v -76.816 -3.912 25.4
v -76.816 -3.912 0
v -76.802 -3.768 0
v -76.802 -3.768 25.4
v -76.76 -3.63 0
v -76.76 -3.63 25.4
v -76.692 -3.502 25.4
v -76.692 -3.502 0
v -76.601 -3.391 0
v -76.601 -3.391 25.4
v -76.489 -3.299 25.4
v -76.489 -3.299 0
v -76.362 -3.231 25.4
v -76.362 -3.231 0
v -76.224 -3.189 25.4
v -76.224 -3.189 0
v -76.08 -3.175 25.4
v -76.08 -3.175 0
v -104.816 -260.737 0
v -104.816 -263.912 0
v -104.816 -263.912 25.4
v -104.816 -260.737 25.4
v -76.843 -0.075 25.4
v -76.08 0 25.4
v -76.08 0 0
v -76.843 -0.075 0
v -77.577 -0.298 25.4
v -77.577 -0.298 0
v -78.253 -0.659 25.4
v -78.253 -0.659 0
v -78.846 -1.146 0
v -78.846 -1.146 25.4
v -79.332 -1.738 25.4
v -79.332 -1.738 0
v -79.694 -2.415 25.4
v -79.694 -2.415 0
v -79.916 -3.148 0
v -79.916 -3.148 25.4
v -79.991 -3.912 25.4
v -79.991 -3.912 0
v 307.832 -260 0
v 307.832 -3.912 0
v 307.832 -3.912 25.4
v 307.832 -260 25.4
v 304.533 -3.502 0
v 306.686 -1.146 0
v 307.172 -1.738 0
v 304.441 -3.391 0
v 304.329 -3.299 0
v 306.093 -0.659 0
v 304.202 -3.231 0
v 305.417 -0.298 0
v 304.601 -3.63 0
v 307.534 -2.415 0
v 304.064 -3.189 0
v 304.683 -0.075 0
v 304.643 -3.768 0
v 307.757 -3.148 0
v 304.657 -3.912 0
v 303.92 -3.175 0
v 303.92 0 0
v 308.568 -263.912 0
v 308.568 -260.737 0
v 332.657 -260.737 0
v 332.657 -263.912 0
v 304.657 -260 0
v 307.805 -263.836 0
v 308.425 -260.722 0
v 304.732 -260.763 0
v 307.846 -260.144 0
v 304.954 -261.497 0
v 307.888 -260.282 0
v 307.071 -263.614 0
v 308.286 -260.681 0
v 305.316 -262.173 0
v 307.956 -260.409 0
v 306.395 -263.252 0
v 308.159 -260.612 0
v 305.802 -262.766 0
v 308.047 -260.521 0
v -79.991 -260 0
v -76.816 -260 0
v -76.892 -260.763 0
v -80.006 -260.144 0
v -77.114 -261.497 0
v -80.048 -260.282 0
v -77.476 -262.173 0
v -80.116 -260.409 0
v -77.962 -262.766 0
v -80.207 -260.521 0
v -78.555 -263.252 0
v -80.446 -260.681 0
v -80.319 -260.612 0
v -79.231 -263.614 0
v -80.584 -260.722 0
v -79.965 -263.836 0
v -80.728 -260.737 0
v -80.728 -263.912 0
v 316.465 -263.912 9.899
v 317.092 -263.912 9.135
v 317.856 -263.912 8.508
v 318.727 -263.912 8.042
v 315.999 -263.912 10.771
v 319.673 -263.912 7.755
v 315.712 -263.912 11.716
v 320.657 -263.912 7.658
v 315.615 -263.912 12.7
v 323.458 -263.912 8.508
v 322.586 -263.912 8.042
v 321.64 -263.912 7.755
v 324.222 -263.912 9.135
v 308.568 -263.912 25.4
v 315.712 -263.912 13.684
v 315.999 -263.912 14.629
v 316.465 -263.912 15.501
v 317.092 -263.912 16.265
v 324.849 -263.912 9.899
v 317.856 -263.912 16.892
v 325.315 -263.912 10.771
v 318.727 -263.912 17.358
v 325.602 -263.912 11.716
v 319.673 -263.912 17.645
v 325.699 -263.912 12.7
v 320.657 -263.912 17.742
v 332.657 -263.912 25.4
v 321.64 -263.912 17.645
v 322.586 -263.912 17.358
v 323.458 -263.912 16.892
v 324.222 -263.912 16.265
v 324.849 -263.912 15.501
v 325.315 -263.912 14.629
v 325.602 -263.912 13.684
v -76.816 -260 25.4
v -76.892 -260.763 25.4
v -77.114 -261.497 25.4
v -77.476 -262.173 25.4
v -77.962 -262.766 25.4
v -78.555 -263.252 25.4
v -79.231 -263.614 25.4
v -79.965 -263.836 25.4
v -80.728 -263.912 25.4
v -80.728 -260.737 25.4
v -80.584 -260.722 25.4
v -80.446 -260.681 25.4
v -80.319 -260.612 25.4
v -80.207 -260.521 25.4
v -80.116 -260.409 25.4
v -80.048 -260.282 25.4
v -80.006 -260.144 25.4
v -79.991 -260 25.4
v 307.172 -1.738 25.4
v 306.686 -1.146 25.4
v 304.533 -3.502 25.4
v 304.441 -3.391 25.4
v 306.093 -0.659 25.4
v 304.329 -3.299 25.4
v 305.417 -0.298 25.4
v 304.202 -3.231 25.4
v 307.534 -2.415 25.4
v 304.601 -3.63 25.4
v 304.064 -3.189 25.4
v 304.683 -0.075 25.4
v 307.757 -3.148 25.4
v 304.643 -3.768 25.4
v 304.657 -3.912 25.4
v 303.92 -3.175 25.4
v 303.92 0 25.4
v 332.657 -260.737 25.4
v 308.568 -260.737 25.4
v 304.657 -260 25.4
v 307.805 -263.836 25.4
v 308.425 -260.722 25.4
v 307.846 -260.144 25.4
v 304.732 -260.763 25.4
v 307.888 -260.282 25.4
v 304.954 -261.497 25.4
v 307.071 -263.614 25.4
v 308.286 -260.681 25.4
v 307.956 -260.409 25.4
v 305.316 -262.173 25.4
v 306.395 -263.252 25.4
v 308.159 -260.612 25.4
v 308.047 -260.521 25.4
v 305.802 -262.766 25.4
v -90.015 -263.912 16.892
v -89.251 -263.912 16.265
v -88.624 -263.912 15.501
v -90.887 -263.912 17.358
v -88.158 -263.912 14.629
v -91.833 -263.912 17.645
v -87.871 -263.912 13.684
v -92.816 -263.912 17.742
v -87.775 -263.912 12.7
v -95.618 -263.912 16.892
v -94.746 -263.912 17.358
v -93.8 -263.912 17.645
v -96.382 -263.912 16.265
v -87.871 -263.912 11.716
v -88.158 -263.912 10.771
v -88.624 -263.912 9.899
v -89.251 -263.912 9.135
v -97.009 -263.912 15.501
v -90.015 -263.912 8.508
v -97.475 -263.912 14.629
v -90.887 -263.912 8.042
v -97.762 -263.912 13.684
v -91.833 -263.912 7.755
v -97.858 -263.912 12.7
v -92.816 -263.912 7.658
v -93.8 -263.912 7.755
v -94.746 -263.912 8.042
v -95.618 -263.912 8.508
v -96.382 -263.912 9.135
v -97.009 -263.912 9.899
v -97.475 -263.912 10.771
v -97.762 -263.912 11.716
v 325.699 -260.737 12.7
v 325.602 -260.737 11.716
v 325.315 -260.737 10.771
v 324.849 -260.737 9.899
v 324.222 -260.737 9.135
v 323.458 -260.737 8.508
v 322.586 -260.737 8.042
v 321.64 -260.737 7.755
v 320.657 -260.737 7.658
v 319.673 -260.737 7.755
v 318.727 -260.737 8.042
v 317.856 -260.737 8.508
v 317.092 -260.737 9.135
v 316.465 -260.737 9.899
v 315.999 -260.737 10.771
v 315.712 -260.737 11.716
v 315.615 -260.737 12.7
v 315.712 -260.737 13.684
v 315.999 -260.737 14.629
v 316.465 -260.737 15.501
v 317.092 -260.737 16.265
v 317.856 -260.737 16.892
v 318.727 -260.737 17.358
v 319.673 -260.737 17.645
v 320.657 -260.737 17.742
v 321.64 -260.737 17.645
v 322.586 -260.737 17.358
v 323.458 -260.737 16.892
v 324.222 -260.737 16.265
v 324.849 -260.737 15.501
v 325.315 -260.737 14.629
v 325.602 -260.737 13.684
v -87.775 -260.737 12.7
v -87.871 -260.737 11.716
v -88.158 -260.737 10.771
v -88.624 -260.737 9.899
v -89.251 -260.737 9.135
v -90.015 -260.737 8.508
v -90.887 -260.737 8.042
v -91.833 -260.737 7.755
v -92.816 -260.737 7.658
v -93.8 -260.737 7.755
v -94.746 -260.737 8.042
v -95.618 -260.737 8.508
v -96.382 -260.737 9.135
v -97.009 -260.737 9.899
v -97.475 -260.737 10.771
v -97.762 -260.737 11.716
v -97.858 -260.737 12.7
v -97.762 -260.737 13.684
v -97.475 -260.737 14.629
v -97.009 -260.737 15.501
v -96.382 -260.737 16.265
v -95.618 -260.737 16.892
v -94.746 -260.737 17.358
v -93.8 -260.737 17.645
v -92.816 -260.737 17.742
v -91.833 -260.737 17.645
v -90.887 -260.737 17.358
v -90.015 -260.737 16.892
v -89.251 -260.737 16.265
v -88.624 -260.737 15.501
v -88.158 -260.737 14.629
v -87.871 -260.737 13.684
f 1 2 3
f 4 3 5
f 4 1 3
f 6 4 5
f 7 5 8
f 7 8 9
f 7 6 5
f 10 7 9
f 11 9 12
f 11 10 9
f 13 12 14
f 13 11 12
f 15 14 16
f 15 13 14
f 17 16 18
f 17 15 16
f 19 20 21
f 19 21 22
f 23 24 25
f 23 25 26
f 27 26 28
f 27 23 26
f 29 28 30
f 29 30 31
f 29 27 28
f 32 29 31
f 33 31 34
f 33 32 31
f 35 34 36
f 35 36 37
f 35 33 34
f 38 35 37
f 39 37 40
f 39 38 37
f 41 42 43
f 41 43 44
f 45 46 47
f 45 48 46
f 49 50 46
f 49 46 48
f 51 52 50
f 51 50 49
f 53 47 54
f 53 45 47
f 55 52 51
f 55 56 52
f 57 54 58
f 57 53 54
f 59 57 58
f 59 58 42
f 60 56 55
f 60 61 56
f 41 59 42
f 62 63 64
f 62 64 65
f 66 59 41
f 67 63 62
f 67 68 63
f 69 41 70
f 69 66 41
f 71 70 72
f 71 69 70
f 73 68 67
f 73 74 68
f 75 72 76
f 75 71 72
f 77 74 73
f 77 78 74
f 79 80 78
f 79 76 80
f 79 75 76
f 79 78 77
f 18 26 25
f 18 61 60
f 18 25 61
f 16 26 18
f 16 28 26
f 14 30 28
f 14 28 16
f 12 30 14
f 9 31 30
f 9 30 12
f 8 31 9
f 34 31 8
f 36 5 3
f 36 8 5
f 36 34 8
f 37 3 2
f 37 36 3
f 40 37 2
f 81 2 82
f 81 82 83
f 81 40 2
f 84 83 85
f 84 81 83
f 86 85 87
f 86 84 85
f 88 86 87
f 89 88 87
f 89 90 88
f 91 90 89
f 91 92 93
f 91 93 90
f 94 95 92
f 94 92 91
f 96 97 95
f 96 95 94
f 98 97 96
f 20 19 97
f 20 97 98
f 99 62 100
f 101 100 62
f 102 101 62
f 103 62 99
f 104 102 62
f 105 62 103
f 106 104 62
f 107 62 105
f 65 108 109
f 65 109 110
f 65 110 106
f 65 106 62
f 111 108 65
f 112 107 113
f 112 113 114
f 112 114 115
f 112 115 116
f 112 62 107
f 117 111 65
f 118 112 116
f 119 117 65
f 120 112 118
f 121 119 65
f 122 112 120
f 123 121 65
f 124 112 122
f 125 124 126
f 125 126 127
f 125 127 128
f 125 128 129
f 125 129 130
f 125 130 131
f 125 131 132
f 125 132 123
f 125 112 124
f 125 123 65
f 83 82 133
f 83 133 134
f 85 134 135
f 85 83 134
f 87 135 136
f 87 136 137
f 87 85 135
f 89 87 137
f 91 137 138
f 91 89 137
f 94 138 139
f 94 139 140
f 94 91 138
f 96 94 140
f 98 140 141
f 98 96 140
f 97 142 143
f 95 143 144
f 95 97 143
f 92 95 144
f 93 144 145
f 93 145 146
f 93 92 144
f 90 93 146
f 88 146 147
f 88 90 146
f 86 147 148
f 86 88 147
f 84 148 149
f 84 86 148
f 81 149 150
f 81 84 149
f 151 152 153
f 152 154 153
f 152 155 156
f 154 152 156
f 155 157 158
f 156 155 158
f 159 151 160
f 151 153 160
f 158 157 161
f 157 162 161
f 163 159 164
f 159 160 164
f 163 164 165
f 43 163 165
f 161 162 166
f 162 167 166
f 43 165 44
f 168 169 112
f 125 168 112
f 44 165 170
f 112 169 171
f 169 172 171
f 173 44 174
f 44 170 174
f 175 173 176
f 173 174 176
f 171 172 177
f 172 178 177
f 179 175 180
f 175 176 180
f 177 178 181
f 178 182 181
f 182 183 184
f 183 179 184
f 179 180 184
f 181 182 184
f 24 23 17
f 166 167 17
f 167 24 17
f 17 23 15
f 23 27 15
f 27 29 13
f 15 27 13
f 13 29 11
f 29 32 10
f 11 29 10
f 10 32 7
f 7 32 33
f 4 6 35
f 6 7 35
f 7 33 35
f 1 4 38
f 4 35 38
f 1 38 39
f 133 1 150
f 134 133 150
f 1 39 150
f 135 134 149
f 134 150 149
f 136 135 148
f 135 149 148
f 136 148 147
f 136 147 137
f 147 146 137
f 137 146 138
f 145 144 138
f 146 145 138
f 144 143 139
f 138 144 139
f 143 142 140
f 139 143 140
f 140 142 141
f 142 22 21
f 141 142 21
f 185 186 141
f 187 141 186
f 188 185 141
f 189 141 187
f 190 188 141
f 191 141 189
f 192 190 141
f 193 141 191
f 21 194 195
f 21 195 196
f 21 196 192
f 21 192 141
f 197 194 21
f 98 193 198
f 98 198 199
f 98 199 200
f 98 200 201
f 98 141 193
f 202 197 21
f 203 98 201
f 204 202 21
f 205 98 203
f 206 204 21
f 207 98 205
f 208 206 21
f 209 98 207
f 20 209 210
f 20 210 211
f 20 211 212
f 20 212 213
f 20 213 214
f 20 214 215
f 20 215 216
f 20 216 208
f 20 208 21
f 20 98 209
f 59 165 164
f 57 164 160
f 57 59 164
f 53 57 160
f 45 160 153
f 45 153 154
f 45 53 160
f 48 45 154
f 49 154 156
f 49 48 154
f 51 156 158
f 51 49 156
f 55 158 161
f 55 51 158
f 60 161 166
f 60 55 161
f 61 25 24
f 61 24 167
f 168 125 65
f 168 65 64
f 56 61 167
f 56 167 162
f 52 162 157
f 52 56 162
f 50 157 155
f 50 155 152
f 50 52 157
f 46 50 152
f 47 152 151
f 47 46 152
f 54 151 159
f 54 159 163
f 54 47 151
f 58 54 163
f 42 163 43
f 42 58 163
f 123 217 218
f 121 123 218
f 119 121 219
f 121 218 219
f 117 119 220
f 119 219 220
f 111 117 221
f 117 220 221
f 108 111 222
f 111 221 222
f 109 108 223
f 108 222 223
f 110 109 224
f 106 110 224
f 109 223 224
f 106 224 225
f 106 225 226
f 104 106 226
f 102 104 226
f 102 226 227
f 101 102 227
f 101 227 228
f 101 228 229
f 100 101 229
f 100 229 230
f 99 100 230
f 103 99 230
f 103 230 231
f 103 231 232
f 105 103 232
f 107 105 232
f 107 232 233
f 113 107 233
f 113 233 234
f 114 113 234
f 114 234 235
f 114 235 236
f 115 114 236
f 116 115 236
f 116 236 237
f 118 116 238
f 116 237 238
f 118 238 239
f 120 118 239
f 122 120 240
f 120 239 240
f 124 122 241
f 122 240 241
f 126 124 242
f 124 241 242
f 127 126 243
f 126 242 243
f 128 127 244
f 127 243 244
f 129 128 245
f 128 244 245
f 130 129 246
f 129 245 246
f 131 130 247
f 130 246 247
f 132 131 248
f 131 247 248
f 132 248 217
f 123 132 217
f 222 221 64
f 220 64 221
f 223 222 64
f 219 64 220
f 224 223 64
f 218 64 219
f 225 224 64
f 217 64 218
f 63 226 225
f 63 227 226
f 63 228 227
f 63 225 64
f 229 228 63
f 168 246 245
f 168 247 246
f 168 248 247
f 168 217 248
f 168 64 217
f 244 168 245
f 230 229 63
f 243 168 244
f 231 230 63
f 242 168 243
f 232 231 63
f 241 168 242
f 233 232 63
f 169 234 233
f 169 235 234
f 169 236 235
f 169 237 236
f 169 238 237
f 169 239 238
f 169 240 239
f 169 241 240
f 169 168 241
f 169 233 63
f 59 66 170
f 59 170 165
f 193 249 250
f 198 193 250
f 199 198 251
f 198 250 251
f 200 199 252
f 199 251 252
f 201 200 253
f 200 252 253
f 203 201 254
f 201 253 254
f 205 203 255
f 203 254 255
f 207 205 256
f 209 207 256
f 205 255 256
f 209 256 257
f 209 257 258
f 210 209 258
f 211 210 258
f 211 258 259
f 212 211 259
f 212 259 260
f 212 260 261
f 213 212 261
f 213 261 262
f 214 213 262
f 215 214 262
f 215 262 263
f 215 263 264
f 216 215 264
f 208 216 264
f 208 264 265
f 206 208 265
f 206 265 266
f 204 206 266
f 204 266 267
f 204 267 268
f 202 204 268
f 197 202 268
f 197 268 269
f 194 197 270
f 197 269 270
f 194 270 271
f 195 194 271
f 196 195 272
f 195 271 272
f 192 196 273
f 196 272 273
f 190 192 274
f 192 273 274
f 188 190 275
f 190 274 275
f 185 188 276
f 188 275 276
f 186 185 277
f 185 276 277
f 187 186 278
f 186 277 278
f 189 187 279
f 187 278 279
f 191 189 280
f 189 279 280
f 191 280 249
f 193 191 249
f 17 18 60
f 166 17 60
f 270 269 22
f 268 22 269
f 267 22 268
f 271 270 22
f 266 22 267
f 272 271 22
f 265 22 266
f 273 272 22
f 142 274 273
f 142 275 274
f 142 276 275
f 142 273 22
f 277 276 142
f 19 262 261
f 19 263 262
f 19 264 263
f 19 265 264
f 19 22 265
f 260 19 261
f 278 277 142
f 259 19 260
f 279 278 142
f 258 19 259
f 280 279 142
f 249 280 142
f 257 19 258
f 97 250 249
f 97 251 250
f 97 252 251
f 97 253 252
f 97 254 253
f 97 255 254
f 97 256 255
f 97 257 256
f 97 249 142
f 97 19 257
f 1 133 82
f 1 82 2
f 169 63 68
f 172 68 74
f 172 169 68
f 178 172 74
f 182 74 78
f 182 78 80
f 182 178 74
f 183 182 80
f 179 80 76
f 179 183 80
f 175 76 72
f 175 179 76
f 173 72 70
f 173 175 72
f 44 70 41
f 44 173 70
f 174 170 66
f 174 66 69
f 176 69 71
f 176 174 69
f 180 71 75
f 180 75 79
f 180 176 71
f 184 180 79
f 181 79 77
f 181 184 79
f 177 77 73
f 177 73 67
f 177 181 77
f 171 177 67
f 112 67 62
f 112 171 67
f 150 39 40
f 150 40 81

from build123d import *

# Parameters (mm, degrees)
CROQUIS1_W                    = 380
CROQUIS1_H                    = 3.175
BRIDA_BASE1_DEPTH             = 25.4
BRIDA_DE_ARISTA1_DEPTH        = 25.4
BRIDA_DE_ARISTA1_BEND_DEPTH   = 25.4
BRIDA_DE_ARISTA2_DEPTH        = 25.4
BRIDA_DE_ARISTA2_BEND_DEPTH   = 25.4
TALADRO_DE_MARGEN_PARA_3_81_D = 10.0838


# Sheet-metal steps are written as plain solids
with BuildPart() as part:
    # Croquis1 → Brida base1 (new body)
    with BuildSketch(Plane.XY):
        with Locations((113.920112782, -1.5875)):
            Rectangle(CROQUIS1_W, CROQUIS1_H)
    extrude(amount=BRIDA_BASE1_DEPTH)

    # Brida de arista1 section (across the edge) → Brida de arista1 (add)
    with BuildSketch(Plane(origin=(304.656712782, -3.175, 0), x_dir=(-1, 0, 0), z_dir=(0, 0, 1))):
        with BuildLine():
            Line((-3.175, 0.7366), (-3.175, 256.825))
            Line((-3.175, 256.825), (0, 256.825))
            Line((0, 256.825), (0, 0.7366))
            ThreePointArc((0, 0.7366), (0.215745145, 0.215745145), (0.7366, 0))
            Line((0.7366, 0), (0.7366, -3.175))
            ThreePointArc((0.7366, -3.175), (-2.029318885, -2.029318885), (-3.175, 0.7366))
        make_face()
    extrude(amount=BRIDA_DE_ARISTA1_DEPTH)

    # Brida de arista1 section 2 (across the edge) → Brida de arista1 bend (add)
    with BuildSketch(Plane(origin=(-76.816487218, -3.175, 25.4), x_dir=(1, 0, 0), z_dir=(0, 0, -1))):
        with BuildLine():
            Line((-3.175, 0.7366), (-3.175, 256.825))
            Line((-3.175, 256.825), (0, 256.825))
            Line((0, 256.825), (0, 0.7366))
            ThreePointArc((0, 0.7366), (0.215745145, 0.215745145), (0.7366, 0))
            Line((0.7366, 0), (0.7366, -3.175))
            ThreePointArc((0.7366, -3.175), (-2.029318885, -2.029318885), (-3.175, 0.7366))
        make_face()
    extrude(amount=BRIDA_DE_ARISTA1_BEND_DEPTH)

    # Brida de arista2 section (across the edge) → Brida de arista2 (add)
    with BuildSketch(Plane(origin=(307.831712782, -260.7366, 25.4), x_dir=(0, 1, 0), z_dir=(0, 0, -1))):
        with BuildLine():
            Line((-3.175, 0.7366), (-3.175, 24.825))
            Line((-3.175, 24.825), (0, 24.825))
            Line((0, 24.825), (0, 0.7366))
            ThreePointArc((0, 0.7366), (0.215745145, 0.215745145), (0.7366, 0))
            Line((0.7366, 0), (0.7366, -3.175))
            ThreePointArc((0.7366, -3.175), (-2.029318885, -2.029318885), (-3.175, 0.7366))
        make_face()
    extrude(amount=BRIDA_DE_ARISTA2_DEPTH)

    # Brida de arista2 section 2 (across the edge) → Brida de arista2 bend (add)
    with BuildSketch(Plane(origin=(-79.991487218, -260.7366, 0), x_dir=(0, 1, 0), z_dir=(0, 0, 1))):
        with BuildLine():
            Line((-3.175, 0.7366), (-3.175, 24.825))
            Line((-3.175, 24.825), (0, 24.825))
            Line((0, 24.825), (0, 0.7366))
            ThreePointArc((0, 0.7366), (0.215745145, 0.215745145), (0.7366, 0))
            Line((0.7366, 0), (0.7366, -3.175))
            ThreePointArc((0.7366, -3.175), (-2.029318885, -2.029318885), (-3.175, 0.7366))
        make_face()
    extrude(amount=BRIDA_DE_ARISTA2_BEND_DEPTH)

    # Taladro de margen para 3/81 (through all)
    with Locations(Plane(origin=(0, -263.9116, 0), x_dir=(-1, 0, 0), z_dir=(0, -1, 0))):
        with Locations((92.816487218, -12.7), (-320.656712782, -12.7)):
            Hole(TALADRO_DE_MARGEN_PARA_3_81_D / 2)


solid = part.part
